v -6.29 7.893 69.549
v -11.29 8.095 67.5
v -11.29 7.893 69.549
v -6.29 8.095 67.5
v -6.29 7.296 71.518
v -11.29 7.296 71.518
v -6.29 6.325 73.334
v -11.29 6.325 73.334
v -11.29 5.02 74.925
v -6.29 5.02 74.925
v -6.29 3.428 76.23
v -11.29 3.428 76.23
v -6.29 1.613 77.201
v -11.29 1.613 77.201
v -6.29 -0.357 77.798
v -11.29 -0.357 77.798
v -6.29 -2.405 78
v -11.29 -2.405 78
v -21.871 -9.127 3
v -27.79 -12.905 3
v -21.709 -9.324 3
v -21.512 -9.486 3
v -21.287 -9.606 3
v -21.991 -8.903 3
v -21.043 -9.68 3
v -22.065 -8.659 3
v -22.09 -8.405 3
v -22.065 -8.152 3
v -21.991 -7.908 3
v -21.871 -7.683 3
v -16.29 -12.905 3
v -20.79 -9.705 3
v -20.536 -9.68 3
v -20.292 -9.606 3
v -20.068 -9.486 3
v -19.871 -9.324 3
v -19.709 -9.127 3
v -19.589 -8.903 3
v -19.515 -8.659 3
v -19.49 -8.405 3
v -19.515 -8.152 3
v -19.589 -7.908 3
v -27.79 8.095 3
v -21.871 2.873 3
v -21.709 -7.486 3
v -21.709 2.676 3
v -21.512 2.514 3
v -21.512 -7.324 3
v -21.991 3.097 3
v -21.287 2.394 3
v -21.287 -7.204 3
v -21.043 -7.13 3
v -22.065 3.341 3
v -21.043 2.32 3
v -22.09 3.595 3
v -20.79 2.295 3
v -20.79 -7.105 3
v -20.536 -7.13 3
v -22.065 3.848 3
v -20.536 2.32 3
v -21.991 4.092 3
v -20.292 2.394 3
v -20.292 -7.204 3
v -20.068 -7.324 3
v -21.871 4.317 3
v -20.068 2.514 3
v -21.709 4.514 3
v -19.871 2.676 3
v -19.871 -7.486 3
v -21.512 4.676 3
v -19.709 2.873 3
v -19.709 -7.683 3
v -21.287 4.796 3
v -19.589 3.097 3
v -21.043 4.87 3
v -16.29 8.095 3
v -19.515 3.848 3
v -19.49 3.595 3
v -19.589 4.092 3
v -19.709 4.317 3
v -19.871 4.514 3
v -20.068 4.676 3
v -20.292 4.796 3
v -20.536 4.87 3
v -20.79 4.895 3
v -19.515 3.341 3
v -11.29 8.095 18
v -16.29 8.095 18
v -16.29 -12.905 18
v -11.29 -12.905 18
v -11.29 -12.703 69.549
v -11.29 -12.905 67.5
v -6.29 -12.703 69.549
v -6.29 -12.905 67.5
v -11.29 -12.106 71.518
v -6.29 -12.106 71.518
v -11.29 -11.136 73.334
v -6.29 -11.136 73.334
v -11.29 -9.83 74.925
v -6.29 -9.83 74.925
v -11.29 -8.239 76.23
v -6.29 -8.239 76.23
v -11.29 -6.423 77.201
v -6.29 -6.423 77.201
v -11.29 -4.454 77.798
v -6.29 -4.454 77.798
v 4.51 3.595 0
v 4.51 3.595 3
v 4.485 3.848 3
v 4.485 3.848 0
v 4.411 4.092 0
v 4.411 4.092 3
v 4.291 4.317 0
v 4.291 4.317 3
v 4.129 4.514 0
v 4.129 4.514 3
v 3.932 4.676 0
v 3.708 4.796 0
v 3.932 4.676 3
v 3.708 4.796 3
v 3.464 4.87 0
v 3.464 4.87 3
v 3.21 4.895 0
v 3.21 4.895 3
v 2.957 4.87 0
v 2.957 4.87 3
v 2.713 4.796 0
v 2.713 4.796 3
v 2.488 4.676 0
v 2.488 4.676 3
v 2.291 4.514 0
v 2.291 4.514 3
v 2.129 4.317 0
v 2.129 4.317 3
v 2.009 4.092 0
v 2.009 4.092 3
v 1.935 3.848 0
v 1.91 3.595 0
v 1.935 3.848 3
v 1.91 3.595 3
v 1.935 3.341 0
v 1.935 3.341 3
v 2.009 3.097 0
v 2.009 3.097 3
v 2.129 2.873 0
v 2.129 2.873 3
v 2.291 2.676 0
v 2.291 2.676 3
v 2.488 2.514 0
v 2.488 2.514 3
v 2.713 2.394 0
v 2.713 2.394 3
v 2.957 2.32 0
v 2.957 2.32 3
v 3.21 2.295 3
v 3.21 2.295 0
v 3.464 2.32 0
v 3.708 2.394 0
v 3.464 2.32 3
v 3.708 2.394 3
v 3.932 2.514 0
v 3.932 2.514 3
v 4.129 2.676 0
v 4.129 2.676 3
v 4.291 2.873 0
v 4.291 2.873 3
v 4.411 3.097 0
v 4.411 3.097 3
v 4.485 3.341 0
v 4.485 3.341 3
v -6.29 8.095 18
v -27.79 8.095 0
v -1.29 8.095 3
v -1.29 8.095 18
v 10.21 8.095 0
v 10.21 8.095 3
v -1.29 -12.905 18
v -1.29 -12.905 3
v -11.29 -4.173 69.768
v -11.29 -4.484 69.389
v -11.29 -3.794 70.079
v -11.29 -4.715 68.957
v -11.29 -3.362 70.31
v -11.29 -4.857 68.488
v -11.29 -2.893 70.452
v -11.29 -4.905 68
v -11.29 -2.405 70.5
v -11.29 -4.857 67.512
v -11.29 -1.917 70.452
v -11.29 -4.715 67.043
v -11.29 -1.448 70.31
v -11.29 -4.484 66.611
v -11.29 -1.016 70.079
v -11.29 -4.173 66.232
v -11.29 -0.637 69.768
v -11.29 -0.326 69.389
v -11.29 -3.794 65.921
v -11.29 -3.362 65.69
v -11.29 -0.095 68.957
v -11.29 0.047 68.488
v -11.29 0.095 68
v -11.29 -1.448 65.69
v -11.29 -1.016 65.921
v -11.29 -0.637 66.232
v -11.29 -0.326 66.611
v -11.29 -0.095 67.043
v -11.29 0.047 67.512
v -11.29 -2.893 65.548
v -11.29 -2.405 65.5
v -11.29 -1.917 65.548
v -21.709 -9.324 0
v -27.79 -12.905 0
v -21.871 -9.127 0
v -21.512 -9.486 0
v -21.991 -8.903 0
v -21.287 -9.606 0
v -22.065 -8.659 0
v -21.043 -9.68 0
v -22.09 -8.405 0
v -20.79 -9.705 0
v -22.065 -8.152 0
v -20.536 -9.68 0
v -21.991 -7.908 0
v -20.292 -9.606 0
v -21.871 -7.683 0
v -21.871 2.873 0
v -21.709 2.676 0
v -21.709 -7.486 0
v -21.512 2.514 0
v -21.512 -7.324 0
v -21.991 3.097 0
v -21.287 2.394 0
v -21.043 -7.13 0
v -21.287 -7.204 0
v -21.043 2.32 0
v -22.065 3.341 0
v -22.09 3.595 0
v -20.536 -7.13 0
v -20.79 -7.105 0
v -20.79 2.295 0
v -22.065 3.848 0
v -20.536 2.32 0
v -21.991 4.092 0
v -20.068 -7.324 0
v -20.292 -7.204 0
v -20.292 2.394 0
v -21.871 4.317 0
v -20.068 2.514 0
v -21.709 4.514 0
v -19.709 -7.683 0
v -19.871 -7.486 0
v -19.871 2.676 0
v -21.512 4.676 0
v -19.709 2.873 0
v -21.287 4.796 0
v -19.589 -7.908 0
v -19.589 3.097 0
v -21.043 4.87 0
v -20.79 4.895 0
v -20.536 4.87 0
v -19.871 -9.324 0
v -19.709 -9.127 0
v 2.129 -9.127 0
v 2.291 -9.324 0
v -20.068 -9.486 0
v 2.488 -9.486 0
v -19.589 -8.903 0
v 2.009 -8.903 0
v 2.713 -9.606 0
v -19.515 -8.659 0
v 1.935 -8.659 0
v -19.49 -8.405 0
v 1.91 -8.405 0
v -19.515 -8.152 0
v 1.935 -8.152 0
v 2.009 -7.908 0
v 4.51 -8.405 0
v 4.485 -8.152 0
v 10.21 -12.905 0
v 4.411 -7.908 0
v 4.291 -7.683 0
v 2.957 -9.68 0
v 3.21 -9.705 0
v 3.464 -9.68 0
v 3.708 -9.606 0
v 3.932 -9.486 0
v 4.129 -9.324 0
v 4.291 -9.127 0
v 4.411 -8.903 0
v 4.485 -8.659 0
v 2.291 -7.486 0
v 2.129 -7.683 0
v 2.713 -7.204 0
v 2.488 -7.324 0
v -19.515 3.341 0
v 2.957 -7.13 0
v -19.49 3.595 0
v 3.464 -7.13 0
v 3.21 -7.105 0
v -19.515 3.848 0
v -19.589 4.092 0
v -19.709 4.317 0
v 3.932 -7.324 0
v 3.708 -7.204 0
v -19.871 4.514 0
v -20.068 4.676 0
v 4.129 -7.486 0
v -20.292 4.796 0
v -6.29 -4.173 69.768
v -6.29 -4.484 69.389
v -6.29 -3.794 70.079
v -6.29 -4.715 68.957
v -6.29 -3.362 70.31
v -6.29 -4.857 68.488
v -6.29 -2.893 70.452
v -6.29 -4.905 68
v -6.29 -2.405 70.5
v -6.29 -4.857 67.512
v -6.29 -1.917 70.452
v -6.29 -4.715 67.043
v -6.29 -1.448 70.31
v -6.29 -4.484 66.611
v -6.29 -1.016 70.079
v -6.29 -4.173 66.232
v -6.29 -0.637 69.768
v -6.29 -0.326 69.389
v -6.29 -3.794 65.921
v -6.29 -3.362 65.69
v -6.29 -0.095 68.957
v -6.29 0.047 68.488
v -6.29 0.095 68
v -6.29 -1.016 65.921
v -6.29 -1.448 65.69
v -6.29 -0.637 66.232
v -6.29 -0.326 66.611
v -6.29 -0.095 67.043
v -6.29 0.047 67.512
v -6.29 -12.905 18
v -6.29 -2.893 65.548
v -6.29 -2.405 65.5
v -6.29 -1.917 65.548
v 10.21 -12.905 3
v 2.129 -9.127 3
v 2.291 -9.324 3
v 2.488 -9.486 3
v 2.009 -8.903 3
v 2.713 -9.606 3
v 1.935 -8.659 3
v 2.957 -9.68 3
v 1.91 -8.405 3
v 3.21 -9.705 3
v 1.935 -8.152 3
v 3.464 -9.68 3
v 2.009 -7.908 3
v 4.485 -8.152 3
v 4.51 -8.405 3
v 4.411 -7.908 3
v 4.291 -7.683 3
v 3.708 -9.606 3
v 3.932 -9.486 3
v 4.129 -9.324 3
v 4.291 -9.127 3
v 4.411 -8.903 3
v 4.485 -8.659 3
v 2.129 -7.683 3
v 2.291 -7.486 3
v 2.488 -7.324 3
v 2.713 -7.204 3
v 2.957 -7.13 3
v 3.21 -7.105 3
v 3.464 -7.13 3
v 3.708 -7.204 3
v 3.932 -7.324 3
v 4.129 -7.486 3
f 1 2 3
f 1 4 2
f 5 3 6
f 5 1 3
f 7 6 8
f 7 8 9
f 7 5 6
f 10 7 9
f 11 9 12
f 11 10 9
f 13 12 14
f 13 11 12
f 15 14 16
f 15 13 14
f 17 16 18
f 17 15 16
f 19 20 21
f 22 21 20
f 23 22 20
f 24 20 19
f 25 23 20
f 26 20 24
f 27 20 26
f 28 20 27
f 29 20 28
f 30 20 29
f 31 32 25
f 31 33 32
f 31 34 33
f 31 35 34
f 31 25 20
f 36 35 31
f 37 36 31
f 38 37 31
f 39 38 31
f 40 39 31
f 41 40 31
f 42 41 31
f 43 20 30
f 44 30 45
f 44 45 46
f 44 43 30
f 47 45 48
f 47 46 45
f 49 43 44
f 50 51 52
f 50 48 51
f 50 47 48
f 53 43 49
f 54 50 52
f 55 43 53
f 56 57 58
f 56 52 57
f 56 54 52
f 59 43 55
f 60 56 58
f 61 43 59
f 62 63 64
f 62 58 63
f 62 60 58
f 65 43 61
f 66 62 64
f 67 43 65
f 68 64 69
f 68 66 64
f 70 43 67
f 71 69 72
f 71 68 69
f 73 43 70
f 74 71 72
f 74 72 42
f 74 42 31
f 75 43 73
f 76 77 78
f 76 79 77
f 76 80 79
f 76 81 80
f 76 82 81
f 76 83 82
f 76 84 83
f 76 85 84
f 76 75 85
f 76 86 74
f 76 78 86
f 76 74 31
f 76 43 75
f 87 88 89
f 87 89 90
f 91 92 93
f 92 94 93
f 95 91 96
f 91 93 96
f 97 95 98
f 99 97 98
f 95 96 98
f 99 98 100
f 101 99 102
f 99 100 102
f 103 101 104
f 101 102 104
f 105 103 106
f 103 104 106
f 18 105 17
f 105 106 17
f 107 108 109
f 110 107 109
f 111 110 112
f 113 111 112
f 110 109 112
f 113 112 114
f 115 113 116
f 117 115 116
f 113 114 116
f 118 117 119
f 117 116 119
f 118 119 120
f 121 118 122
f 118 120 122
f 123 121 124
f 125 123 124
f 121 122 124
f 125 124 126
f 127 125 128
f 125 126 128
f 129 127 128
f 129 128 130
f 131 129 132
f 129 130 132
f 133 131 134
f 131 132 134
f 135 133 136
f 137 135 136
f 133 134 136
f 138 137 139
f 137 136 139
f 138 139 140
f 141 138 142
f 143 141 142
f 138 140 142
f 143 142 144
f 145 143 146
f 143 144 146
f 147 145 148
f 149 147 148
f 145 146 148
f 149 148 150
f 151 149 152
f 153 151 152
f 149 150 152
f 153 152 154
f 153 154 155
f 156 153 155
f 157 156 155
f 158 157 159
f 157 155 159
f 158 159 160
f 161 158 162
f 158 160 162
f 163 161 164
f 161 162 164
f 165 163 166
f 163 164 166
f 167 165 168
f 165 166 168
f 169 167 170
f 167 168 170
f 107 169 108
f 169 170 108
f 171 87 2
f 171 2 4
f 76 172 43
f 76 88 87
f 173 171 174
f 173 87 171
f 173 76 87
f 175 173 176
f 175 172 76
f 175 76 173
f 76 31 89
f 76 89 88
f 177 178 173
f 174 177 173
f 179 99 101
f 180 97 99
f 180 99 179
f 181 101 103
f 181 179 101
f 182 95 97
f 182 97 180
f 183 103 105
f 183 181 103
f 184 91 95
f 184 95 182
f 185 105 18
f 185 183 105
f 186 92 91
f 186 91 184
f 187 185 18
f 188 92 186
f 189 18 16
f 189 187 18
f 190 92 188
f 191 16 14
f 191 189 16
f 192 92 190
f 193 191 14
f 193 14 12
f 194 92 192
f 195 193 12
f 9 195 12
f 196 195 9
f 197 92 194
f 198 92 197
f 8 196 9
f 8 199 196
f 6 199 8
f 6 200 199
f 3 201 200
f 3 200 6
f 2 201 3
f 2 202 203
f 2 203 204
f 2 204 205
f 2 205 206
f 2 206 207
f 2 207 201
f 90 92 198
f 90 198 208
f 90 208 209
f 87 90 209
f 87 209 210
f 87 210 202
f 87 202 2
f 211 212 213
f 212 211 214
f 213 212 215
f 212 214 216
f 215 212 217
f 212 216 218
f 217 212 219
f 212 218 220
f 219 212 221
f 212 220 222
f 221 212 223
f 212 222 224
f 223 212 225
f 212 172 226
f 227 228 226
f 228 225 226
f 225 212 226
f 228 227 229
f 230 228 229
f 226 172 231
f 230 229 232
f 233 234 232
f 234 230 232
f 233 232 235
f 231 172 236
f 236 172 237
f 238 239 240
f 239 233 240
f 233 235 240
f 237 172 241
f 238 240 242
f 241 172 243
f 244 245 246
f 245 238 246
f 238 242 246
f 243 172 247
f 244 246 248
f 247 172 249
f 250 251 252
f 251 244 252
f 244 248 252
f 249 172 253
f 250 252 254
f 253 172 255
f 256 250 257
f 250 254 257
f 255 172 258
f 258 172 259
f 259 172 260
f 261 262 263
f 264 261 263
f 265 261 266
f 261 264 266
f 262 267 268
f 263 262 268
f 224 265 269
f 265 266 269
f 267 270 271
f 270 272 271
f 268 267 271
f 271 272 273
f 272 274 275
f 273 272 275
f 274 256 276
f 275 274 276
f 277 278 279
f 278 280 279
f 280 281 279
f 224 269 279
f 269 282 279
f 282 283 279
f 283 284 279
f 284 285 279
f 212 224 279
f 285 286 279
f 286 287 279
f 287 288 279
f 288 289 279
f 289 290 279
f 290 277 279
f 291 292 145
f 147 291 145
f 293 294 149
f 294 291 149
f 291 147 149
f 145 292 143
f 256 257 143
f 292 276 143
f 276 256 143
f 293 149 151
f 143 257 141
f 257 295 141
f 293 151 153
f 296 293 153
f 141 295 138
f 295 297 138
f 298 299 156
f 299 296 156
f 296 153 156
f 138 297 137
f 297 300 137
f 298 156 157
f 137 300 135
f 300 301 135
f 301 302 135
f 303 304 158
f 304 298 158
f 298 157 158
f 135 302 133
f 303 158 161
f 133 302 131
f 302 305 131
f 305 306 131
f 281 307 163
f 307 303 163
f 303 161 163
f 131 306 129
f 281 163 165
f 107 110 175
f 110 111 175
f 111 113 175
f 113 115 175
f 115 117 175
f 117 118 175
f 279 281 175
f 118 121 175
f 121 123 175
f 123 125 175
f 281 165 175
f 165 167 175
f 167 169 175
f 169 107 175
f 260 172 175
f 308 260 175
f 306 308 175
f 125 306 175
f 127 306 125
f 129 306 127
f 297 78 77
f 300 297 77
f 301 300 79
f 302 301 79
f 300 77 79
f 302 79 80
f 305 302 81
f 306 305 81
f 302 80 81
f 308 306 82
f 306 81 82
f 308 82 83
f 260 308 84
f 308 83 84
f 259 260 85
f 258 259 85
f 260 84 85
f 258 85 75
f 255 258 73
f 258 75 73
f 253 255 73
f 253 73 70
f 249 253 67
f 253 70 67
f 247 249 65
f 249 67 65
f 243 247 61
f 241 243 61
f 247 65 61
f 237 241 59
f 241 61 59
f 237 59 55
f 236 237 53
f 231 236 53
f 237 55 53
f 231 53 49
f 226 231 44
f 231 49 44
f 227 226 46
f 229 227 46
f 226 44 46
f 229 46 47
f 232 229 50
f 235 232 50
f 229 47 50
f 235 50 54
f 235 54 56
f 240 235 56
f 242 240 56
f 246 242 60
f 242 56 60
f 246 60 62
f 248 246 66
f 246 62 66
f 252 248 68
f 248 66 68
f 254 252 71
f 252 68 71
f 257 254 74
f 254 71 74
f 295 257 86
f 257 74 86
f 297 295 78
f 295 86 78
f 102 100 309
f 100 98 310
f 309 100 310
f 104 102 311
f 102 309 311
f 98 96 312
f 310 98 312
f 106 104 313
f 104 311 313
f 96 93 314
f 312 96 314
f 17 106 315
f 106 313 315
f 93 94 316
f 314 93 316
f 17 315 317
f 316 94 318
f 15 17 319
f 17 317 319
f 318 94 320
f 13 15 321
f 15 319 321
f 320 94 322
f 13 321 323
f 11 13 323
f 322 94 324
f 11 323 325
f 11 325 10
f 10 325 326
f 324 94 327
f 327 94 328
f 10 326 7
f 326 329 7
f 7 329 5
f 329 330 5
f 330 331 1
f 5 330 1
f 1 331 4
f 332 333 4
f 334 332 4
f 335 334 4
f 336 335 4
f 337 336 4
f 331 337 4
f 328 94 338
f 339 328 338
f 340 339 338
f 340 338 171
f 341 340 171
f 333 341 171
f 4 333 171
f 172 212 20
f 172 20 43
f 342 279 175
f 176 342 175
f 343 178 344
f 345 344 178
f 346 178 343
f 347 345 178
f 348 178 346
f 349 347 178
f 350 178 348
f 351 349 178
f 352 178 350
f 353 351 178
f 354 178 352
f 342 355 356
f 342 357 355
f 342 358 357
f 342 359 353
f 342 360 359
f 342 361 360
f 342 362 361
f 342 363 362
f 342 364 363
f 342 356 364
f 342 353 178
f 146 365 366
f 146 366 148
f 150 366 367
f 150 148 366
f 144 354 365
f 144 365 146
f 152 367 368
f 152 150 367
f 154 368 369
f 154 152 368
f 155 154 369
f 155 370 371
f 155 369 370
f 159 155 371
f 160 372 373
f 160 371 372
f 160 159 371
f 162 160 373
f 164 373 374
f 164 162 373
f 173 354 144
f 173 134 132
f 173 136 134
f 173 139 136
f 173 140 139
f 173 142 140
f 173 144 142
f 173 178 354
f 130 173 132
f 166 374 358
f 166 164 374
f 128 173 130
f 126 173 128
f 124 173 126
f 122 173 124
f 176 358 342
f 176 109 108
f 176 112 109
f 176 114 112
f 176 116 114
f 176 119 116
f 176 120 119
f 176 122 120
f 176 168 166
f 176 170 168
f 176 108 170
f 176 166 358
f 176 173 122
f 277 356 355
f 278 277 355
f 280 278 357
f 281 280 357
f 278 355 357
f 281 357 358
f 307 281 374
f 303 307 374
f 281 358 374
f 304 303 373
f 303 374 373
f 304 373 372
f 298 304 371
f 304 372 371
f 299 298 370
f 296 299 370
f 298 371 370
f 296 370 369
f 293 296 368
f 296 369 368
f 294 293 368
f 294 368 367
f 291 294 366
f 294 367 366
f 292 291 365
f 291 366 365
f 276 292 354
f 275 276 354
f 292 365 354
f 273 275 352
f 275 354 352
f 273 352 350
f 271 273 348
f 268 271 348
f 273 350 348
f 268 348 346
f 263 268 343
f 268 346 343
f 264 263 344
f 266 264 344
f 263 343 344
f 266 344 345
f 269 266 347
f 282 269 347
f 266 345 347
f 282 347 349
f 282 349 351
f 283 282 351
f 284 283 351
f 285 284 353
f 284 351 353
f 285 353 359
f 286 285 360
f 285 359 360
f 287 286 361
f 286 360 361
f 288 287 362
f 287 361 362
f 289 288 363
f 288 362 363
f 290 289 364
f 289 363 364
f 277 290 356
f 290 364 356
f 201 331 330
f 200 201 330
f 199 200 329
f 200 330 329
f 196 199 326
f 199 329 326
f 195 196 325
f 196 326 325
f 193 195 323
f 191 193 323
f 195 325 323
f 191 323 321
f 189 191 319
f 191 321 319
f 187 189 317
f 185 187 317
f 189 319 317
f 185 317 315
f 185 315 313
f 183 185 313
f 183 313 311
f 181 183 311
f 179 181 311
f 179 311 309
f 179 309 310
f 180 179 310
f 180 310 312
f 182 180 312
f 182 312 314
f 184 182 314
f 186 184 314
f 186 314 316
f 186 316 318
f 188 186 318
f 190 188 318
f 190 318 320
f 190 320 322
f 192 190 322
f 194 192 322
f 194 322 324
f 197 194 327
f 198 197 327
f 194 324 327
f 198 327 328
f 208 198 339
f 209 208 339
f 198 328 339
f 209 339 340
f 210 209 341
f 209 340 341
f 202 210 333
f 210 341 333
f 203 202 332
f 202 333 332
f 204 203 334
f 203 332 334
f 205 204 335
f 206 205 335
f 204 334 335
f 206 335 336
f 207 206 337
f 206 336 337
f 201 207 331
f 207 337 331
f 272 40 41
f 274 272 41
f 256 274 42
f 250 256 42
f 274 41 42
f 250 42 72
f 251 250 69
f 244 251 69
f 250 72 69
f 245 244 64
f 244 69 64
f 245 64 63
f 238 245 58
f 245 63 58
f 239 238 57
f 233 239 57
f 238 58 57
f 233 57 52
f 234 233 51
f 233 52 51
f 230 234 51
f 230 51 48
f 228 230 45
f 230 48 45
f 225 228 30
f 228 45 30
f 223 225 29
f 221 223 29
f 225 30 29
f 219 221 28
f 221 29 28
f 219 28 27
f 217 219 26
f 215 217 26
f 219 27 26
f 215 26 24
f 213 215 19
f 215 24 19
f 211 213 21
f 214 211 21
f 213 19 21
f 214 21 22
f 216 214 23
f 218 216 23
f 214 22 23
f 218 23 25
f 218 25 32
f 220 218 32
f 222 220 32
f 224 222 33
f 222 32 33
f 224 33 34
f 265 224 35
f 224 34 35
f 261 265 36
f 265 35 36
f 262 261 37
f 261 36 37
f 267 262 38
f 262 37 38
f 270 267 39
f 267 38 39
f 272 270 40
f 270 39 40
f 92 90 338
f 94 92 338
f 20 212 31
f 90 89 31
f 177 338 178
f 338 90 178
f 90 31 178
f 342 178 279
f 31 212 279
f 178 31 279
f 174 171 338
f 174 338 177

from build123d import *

# Parameters (mm, degrees)
SKETCH_1_W             = 38
SKETCH_1_H             = 21
EXTRUDE_1_DEPTH        = 3
SKETCH_2_R             = 1.3
CUT_EXTRUDE_1_DEPTH    = 3
PATTERN_LINEAR_1_COUNT = 2
PATTERN_LINEAR_1_PITCH = 24
SKETCH_3_W             = 15
SKETCH_3_H             = 21
EXTRUDE_2_DEPTH        = 15
SKETCH_4_W             = 5
SKETCH_4_H             = 21
EXTRUDE_3_DEPTH        = 60
SKETCH_5_R             = 2.5
CUT_EXTRUDE_2_DEPTH    = 60
FILLET_1_R             = 10.5


with BuildPart() as part:
    # 草图1 → 凸台-拉伸1 (new body)
    with BuildSketch(Plane.XY):
        with Locations((-8.78974359, -2.405128205)):
            Rectangle(SKETCH_1_W, SKETCH_1_H)
    extrude(amount=EXTRUDE_1_DEPTH)

    # 草图2 → 切除-拉伸1 (cut)
    with BuildSketch(Plane.XY.offset(3)):
        with Locations((-20.78974359, 3.594871795)):
            Circle(SKETCH_2_R)
        with Locations((-20.78974359, -8.405128205)):
            Circle(SKETCH_2_R)
    cut_extrude_1 = extrude(amount=-CUT_EXTRUDE_1_DEPTH, mode=Mode.SUBTRACT)

    # 阵列(线性)1: 切除-拉伸1 ×2
    with Locations(*[(i * PATTERN_LINEAR_1_PITCH, 0, 0) for i in range(1, PATTERN_LINEAR_1_COUNT)]):
        add(cut_extrude_1, mode=Mode.SUBTRACT)

    # 草图3 → 凸台-拉伸2 (add)
    with BuildSketch(Plane.XY.offset(3)):
        with Locations((-8.78974359, -2.405128205)):
            Rectangle(SKETCH_3_W, SKETCH_3_H)
    extrude(amount=EXTRUDE_2_DEPTH)

    # 草图4 → 凸台-拉伸3 (add)
    with BuildSketch(Plane.XY.offset(18)):
        with Locations((-8.78974359, -2.405128205)):
            Rectangle(SKETCH_4_W, SKETCH_4_H)
    extrude(amount=EXTRUDE_3_DEPTH)

    # 草图5 → 切除-拉伸2 (cut)
    with BuildSketch(Plane(origin=(-6.28974359, 0, 0), x_dir=(0, 0, -1), z_dir=(1, 0, 0))):
        with Locations(Location((-68, -2.405128205, 0), (0, 0, 90))):
            Circle(SKETCH_5_R)
    extrude(amount=-CUT_EXTRUDE_2_DEPTH, mode=Mode.SUBTRACT)

    # 圆角1
    fillet_1_edges = [part.edges().sort_by_distance(p)[0] for p in [
        (-8.78974359, 8.094871795, 78),
        (-8.78974359, -12.905128205, 78),
    ]]
    fillet(fillet_1_edges, radius=FILLET_1_R - 0.0001)  # a hair under: the kernel refuses the full size


solid = part.part
